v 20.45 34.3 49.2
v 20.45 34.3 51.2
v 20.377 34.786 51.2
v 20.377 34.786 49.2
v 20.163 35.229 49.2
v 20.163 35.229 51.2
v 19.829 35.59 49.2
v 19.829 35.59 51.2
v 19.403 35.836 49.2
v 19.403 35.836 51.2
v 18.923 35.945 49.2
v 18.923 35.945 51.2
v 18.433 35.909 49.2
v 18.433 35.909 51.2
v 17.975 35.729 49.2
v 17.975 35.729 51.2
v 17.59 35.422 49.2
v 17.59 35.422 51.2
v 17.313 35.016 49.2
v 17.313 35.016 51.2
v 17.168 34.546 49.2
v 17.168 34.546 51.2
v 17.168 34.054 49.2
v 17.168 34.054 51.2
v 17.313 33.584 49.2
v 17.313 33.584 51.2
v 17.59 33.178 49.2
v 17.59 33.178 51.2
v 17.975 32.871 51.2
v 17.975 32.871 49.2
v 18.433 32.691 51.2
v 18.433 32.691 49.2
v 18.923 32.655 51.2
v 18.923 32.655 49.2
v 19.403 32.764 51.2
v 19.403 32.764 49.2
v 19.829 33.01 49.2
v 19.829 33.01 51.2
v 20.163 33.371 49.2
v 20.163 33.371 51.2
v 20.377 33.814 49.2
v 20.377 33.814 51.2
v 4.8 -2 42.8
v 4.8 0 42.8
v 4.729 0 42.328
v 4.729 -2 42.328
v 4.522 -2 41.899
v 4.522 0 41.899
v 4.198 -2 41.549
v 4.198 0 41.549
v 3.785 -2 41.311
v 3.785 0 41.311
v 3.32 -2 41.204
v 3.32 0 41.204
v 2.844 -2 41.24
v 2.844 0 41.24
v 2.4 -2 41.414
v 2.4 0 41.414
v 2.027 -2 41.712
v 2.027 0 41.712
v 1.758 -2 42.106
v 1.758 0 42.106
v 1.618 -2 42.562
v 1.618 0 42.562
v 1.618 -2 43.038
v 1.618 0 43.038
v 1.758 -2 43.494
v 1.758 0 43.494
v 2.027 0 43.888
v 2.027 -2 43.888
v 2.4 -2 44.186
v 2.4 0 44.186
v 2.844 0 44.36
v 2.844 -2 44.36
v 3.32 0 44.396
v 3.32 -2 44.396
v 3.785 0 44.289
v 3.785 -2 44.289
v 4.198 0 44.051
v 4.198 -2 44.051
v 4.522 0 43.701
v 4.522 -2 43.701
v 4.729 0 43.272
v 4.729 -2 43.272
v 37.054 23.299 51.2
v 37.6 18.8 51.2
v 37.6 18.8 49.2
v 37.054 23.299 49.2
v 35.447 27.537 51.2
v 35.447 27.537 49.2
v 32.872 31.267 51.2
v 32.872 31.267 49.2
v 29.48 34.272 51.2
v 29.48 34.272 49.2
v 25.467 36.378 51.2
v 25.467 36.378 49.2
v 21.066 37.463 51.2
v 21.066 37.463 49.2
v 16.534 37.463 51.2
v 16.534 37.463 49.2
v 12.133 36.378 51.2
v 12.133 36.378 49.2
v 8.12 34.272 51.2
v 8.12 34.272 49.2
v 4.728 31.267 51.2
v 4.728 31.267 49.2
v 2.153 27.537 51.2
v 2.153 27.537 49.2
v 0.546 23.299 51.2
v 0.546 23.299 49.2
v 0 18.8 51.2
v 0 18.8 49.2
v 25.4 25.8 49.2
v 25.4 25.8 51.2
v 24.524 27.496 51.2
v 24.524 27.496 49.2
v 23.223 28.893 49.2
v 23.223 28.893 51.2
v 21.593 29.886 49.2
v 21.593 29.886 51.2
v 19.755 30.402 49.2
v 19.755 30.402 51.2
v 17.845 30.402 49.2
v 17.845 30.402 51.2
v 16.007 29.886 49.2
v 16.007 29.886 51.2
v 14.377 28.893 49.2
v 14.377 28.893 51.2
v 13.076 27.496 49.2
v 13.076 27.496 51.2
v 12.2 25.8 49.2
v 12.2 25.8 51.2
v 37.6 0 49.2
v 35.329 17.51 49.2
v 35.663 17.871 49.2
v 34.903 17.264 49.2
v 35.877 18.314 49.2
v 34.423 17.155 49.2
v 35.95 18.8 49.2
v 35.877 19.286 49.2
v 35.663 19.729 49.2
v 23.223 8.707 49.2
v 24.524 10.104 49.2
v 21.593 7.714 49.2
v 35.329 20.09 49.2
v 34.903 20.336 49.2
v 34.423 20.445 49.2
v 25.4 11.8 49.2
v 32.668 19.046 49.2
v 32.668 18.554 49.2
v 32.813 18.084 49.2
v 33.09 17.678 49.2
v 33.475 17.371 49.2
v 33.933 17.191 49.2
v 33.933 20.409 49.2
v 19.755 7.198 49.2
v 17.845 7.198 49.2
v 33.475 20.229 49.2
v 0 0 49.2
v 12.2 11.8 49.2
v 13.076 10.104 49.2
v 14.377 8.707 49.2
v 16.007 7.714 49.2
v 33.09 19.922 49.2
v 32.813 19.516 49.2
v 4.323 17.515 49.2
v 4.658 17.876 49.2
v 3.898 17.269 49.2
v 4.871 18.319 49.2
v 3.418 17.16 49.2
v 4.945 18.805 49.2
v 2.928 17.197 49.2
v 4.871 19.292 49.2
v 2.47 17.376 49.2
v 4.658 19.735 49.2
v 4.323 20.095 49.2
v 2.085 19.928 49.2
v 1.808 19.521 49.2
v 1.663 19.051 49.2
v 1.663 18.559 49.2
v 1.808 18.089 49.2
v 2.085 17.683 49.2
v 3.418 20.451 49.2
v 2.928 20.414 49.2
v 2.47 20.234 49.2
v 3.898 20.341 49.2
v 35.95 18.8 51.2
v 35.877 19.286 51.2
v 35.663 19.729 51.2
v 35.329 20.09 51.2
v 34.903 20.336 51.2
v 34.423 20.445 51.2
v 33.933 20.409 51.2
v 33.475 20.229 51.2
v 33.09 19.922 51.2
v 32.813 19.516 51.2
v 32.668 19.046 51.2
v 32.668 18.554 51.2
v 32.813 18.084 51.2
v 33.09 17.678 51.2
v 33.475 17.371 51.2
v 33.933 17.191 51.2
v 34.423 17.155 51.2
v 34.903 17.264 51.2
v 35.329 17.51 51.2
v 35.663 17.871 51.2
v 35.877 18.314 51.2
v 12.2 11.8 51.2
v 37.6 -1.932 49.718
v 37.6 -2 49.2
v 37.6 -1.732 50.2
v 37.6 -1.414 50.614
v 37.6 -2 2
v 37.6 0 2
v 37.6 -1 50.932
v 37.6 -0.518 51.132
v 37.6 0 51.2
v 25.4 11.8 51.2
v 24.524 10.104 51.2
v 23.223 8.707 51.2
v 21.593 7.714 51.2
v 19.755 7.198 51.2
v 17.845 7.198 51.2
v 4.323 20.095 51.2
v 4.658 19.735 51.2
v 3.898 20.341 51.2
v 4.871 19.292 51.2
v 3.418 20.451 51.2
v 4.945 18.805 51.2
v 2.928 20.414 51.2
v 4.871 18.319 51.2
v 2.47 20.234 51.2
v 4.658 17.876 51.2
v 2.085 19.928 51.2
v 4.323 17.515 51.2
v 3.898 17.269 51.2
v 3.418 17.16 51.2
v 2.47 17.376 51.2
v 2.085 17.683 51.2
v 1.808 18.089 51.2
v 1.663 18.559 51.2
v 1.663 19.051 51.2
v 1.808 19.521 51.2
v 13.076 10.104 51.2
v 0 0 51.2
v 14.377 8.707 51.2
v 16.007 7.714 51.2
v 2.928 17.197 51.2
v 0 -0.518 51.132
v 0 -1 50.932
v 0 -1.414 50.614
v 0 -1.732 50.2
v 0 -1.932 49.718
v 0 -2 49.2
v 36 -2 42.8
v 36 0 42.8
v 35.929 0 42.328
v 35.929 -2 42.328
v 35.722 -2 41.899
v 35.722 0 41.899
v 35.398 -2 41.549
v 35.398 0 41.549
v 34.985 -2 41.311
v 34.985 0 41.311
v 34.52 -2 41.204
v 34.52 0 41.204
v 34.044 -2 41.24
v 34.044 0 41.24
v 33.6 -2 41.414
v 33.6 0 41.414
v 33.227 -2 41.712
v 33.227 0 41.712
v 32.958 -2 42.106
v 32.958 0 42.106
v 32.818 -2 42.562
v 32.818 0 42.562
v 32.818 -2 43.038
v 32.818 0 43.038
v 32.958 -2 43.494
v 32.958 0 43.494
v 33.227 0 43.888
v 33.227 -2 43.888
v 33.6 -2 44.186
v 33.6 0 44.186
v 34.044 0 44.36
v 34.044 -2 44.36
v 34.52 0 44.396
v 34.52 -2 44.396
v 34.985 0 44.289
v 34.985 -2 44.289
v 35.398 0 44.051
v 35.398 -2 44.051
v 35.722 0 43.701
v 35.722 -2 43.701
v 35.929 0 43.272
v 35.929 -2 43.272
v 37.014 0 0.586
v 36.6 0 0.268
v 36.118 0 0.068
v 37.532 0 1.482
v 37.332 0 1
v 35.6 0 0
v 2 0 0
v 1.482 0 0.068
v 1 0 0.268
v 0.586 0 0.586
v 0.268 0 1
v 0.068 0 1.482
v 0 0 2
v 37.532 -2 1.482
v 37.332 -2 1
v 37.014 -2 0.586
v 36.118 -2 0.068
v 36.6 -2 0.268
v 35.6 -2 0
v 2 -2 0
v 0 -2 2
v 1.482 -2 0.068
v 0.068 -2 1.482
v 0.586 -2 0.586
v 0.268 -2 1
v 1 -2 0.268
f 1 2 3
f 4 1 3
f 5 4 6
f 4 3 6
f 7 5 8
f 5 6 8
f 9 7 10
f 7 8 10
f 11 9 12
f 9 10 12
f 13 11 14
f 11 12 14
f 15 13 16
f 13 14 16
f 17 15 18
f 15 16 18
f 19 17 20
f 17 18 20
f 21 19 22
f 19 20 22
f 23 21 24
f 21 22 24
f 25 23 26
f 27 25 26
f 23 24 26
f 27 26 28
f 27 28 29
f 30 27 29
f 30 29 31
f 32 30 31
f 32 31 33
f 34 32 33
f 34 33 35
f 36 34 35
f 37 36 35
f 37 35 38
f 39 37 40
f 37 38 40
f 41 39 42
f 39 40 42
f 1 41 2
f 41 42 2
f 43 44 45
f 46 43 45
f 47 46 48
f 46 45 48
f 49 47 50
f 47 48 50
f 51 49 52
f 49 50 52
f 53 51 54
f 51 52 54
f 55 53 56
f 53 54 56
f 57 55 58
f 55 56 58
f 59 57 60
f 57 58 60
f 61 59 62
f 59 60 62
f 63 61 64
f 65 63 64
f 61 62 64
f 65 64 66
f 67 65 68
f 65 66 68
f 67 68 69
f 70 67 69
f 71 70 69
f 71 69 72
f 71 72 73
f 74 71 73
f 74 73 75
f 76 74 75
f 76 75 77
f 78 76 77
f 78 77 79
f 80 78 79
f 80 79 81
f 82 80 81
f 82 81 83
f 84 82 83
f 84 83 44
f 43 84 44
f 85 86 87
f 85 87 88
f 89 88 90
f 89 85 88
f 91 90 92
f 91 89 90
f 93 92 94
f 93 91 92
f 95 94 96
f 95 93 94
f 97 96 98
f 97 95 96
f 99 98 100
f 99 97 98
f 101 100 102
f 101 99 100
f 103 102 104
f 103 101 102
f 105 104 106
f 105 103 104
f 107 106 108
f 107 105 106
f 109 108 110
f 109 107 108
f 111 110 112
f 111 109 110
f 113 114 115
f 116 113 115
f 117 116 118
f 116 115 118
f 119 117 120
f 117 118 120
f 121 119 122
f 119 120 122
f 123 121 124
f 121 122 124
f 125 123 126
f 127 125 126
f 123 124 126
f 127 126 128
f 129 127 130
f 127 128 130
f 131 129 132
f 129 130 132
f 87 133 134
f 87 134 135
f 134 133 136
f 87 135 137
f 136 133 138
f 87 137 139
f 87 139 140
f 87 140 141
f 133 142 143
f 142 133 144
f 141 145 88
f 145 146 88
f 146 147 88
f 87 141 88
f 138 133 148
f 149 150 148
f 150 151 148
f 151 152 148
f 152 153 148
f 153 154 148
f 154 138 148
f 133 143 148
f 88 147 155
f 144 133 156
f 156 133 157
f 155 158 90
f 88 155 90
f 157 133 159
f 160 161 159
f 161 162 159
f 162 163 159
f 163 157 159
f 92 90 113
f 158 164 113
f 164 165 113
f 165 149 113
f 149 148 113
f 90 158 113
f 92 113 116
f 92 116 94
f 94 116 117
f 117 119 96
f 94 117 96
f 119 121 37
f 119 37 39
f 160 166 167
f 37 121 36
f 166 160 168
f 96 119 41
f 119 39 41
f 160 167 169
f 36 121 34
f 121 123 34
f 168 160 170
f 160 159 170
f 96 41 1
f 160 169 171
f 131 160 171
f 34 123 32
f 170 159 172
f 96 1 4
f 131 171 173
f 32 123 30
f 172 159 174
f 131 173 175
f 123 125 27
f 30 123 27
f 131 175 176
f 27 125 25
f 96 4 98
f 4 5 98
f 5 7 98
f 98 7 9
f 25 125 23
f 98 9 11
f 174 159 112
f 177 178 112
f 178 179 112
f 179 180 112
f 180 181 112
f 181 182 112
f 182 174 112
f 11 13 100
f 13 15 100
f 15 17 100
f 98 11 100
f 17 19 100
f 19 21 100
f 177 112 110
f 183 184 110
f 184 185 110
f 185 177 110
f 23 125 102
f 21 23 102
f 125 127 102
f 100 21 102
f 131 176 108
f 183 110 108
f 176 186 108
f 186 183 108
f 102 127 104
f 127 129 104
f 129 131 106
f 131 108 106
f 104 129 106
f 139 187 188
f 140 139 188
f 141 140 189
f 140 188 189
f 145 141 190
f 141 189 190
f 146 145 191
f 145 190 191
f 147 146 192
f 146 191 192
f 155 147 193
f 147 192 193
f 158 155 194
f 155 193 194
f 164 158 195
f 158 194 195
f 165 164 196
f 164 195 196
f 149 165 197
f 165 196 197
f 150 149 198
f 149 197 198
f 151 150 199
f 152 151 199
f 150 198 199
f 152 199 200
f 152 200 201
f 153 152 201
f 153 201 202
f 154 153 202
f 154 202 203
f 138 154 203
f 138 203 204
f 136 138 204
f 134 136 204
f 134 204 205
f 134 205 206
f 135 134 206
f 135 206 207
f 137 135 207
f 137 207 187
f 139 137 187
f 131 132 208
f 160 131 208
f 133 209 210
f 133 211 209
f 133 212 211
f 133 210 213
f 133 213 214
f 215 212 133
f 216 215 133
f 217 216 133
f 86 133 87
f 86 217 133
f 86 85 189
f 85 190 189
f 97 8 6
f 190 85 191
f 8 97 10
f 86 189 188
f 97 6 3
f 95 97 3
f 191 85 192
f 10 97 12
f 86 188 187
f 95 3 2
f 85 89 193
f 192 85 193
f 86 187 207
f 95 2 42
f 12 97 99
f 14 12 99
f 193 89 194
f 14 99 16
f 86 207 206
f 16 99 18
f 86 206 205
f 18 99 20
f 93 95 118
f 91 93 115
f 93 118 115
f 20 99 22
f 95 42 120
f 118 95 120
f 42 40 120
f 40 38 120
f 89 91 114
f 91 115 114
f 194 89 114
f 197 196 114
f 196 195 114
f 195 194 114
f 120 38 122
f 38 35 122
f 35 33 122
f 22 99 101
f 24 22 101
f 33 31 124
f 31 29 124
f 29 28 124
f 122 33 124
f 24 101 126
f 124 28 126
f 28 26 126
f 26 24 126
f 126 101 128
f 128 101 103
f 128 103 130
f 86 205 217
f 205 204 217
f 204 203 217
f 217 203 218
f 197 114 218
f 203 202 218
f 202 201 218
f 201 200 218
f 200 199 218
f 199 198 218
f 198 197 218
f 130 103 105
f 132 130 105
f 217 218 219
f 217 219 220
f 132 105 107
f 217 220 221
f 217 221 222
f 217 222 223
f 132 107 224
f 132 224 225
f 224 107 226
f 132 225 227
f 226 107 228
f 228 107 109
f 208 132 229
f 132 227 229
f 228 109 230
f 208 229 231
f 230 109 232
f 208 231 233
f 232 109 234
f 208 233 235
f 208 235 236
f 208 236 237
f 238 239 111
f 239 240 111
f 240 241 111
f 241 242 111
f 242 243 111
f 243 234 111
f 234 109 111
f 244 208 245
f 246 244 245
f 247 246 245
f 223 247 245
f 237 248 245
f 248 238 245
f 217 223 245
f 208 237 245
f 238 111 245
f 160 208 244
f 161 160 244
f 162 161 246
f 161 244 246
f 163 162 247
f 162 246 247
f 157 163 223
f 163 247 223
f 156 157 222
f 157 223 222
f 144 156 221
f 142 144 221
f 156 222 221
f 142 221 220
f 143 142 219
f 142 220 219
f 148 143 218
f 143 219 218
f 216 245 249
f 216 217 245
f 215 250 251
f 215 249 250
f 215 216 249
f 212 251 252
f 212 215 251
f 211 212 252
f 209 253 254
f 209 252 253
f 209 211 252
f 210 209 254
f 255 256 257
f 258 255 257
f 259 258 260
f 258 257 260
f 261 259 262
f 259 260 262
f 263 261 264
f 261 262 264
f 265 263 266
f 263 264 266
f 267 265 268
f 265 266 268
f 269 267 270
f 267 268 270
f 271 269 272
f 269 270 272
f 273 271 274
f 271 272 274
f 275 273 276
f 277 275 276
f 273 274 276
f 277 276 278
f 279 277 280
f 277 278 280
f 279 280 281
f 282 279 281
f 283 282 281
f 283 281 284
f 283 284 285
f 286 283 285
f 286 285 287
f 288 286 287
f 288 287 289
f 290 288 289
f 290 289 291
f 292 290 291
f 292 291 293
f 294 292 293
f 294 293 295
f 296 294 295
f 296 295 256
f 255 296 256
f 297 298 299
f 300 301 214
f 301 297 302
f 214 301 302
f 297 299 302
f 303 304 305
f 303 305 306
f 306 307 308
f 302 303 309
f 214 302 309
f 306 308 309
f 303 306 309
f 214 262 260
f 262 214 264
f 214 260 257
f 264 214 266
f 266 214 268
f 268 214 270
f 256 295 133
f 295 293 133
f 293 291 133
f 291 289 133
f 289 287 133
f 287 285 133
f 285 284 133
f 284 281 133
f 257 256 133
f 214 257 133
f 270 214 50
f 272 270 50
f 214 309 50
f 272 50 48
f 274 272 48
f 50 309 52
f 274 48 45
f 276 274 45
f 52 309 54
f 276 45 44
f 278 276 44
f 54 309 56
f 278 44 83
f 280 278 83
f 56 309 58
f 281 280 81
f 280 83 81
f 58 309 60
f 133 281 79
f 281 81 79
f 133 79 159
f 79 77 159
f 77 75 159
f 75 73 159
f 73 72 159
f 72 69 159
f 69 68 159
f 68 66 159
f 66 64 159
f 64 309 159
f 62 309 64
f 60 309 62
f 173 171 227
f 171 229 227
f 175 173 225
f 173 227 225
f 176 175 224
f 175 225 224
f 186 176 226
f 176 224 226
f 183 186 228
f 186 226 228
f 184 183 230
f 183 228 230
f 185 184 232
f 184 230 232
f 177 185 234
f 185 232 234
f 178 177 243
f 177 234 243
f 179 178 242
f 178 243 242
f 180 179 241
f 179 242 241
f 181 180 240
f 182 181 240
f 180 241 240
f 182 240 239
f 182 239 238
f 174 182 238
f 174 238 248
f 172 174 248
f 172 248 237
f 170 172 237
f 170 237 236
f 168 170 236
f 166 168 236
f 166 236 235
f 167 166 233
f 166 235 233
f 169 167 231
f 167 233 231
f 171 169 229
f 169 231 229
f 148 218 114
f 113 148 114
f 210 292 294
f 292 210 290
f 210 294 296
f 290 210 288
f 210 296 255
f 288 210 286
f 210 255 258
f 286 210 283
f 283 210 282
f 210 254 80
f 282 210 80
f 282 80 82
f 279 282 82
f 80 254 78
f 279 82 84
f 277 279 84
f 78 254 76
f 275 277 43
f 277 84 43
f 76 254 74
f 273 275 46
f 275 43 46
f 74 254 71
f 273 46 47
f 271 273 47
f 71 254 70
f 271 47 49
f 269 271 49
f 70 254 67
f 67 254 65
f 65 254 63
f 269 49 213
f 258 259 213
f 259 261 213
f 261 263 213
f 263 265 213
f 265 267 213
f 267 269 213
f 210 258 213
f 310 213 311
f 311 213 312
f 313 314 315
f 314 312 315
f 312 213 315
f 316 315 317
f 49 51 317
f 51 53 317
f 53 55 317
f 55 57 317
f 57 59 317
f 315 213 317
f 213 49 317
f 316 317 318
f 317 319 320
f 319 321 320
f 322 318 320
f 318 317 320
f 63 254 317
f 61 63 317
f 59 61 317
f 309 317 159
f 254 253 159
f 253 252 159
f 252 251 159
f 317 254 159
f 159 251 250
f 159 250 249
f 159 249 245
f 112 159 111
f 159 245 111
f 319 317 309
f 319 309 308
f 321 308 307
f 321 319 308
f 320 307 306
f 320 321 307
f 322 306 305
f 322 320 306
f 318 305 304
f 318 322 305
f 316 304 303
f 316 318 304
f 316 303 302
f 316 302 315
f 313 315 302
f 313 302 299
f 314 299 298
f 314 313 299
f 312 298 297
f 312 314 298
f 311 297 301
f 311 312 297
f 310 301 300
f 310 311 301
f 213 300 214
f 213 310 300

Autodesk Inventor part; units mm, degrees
ref_plane "YZ Plane" through (0, 0, 0) normal (1, 0, 0) x (0, 1, 0)
ref_plane "XZ Plane" through (0, 0, 0) normal (0, 1, 0) x (-1, 0, 0)
ref_plane "XY Plane" through (0, 0, 0) normal (0, 0, 1) x (1, 0, 0)
sketch "Sketch1" plane through (0, 0, 0) normal (1, 0, 0) x (0, 1, 0)
  line L0 (0, 0) -> (0, 49.2)
  line L1 (0, 49.2) -> (37.6, 49.2)
  line L2 (37.6, 51.2) -> (-2, 51.2)
  line L3 (-2, 51.2) -> (-2, 0)
  line L4 (37.6, 51.2) -> (37.6, 49.2)
  line L5 (0, 0) -> (-2, 0)
  dimension "d0" = 49.2
  dimension "d1" = 37.6
  dimension "d2" = 2
extrude "Extrusion1" add sketch "Sketch1" along normal blind 37.6
fillet "Fillet1" radius 2 1 edges at (18.8, -2, 51.2)
fillet "Fillet2" radius 2 2 edges at (37.6, -1, 0) (0, -1, 0)
sketch "Sketch2" plane through (0, 37.6, 51.2) normal (0, 0, 1) x (1, 0, 0)
  line L0 (0, -39.6) -> (37.6, -39.6)
  line L1 (0, -39.6) -> (0, -18.8)
  line L2 (0, -37.6) -> (0, 0)
  circle A0 centre (18.794722, -18.794721) radius 15.5
  circle A1 centre (3.294722, -18.794721) radius 1.65
  circle A2 centre (34.3, -18.8) radius 1.65
  circle A3 centre (18.8, -3.3) radius 1.65
  circle A4 centre (18.794722, -18.794721) radius 18.805278
  line L3 (37.6, -37.6) -> (37.6, 0)
  line L4 (37.6, -18.8) -> (37.6, 0)
  line L5 (0, 0) -> (37.6, 0)
  line L6 (37.6, 0) -> (0, 0)
  line L7 (0, 0) -> (0, -18.16472)
  arc A5 (37.6, -18.8) -> (0, -18.8) centre (18.8, -18.8) ccw
  line L8 (18.8, -18.8) -> (18.8, -11.8)
  line L9 (18.8, -11.8) -> (18.8, -25.8)
  line L10 (18.8, -18.8) -> (25.4, -18.8)
  line L11 (25.4, -18.8) -> (12.2, -18.8)
  line L12 (18.8, -11.8) -> (12.2, -11.8)
  line L13 (12.2, -11.8) -> (12.2, -25.8)
  line L14 (12.2, -25.8) -> (25.4, -25.8)
  line L15 (25.4, -25.8) -> (25.4, -11.8)
  line L16 (25.4, -11.8) -> (18.8, -11.8)
  arc A6 (25.4, -11.8) -> (12.2, -11.8) centre (18.8, -14.132381) ccw
  arc A7 (12.2, -25.8) -> (25.4, -25.8) centre (18.8, -23.467619) ccw
  dimension "d8" = 31
  dimension "d7" = 20.8
  dimension "d9" = 3.3
  dimension "d10" = 3.3
  dimension "d11" = 3.3
  dimension "d16" = 7
  dimension "d17" = 14
  dimension "d18" = 6.6
  dimension "d19" = 13.2
  dimension "d20" = 7
  dimension "d21" = 7
extrude "Extrusion2" cut sketch "Sketch2" against normal through all contours A0 A2 | A0 A2 | A3 A0 | A0 A3 | A1 A0 | A0 A1
sketch "Sketch2 outline for Extrusion3" plane through (0, 37.6, 51.2) normal (0, 0, 1) x (1, 0, 0)
  line L0 (0, 0) -> (0, -18.8)
  arc A0 (18.8, 0) -> (0, -18.8) centre (18.8, -18.8) ccw
  line L1 (18.8, 0) -> (0, 0)
  arc A1 (37.6, -18.8) -> (18.8, 0) centre (18.8, -18.8) ccw
  line L2 (37.6, 0) -> (18.8, 0)
  line L3 (37.6, -18.8) -> (37.6, 0)
extrude "Extrusion3" cut sketch "Sketch2 outline for Extrusion3" against normal through all
extrude "Extrusion4" cut sketch "Sketch2" against normal blind 37.6 contours L11 L13 L12 L8 | L10 L15 L14 L9 | L8 L16 L15 L10 | L9 L14 L13 L11 | L12 A6 L16 | L14 A7
sketch "Sketch4" plane through (0, 0, 49.2) normal (0, 1, 0) x (1, 0, 0)
  line L0 (37.6, -2) -> (0, -2) projected
  line L1 (0, -2) -> (0, 6.4)
  line L2 (0, 47.2) -> (0, 0) projected
  line L3 (18.8, -2) -> (3.2, -2)
  line L4 (3.2, -2) -> (34.4, -2)
  line L5 (3.2, -2) -> (3.2, 6.4)
  circle A0 centre (3.2, 6.4) radius 1.6
  line L6 (34.4, -2) -> (34.4, 6.4)
  circle A1 centre (34.4, 6.4) radius 1.6
  point P0 (0, 49.2)
  dimension "d24" = 8.4
  dimension "d25" = 15.6
  dimension "d26" = 31.2
  dimension "d27" = 3.2
  dimension "d28" = 3.2
extrude "Extrusion5" cut sketch "Sketch4" against normal blind 37.6
properties part number "motor mount"
